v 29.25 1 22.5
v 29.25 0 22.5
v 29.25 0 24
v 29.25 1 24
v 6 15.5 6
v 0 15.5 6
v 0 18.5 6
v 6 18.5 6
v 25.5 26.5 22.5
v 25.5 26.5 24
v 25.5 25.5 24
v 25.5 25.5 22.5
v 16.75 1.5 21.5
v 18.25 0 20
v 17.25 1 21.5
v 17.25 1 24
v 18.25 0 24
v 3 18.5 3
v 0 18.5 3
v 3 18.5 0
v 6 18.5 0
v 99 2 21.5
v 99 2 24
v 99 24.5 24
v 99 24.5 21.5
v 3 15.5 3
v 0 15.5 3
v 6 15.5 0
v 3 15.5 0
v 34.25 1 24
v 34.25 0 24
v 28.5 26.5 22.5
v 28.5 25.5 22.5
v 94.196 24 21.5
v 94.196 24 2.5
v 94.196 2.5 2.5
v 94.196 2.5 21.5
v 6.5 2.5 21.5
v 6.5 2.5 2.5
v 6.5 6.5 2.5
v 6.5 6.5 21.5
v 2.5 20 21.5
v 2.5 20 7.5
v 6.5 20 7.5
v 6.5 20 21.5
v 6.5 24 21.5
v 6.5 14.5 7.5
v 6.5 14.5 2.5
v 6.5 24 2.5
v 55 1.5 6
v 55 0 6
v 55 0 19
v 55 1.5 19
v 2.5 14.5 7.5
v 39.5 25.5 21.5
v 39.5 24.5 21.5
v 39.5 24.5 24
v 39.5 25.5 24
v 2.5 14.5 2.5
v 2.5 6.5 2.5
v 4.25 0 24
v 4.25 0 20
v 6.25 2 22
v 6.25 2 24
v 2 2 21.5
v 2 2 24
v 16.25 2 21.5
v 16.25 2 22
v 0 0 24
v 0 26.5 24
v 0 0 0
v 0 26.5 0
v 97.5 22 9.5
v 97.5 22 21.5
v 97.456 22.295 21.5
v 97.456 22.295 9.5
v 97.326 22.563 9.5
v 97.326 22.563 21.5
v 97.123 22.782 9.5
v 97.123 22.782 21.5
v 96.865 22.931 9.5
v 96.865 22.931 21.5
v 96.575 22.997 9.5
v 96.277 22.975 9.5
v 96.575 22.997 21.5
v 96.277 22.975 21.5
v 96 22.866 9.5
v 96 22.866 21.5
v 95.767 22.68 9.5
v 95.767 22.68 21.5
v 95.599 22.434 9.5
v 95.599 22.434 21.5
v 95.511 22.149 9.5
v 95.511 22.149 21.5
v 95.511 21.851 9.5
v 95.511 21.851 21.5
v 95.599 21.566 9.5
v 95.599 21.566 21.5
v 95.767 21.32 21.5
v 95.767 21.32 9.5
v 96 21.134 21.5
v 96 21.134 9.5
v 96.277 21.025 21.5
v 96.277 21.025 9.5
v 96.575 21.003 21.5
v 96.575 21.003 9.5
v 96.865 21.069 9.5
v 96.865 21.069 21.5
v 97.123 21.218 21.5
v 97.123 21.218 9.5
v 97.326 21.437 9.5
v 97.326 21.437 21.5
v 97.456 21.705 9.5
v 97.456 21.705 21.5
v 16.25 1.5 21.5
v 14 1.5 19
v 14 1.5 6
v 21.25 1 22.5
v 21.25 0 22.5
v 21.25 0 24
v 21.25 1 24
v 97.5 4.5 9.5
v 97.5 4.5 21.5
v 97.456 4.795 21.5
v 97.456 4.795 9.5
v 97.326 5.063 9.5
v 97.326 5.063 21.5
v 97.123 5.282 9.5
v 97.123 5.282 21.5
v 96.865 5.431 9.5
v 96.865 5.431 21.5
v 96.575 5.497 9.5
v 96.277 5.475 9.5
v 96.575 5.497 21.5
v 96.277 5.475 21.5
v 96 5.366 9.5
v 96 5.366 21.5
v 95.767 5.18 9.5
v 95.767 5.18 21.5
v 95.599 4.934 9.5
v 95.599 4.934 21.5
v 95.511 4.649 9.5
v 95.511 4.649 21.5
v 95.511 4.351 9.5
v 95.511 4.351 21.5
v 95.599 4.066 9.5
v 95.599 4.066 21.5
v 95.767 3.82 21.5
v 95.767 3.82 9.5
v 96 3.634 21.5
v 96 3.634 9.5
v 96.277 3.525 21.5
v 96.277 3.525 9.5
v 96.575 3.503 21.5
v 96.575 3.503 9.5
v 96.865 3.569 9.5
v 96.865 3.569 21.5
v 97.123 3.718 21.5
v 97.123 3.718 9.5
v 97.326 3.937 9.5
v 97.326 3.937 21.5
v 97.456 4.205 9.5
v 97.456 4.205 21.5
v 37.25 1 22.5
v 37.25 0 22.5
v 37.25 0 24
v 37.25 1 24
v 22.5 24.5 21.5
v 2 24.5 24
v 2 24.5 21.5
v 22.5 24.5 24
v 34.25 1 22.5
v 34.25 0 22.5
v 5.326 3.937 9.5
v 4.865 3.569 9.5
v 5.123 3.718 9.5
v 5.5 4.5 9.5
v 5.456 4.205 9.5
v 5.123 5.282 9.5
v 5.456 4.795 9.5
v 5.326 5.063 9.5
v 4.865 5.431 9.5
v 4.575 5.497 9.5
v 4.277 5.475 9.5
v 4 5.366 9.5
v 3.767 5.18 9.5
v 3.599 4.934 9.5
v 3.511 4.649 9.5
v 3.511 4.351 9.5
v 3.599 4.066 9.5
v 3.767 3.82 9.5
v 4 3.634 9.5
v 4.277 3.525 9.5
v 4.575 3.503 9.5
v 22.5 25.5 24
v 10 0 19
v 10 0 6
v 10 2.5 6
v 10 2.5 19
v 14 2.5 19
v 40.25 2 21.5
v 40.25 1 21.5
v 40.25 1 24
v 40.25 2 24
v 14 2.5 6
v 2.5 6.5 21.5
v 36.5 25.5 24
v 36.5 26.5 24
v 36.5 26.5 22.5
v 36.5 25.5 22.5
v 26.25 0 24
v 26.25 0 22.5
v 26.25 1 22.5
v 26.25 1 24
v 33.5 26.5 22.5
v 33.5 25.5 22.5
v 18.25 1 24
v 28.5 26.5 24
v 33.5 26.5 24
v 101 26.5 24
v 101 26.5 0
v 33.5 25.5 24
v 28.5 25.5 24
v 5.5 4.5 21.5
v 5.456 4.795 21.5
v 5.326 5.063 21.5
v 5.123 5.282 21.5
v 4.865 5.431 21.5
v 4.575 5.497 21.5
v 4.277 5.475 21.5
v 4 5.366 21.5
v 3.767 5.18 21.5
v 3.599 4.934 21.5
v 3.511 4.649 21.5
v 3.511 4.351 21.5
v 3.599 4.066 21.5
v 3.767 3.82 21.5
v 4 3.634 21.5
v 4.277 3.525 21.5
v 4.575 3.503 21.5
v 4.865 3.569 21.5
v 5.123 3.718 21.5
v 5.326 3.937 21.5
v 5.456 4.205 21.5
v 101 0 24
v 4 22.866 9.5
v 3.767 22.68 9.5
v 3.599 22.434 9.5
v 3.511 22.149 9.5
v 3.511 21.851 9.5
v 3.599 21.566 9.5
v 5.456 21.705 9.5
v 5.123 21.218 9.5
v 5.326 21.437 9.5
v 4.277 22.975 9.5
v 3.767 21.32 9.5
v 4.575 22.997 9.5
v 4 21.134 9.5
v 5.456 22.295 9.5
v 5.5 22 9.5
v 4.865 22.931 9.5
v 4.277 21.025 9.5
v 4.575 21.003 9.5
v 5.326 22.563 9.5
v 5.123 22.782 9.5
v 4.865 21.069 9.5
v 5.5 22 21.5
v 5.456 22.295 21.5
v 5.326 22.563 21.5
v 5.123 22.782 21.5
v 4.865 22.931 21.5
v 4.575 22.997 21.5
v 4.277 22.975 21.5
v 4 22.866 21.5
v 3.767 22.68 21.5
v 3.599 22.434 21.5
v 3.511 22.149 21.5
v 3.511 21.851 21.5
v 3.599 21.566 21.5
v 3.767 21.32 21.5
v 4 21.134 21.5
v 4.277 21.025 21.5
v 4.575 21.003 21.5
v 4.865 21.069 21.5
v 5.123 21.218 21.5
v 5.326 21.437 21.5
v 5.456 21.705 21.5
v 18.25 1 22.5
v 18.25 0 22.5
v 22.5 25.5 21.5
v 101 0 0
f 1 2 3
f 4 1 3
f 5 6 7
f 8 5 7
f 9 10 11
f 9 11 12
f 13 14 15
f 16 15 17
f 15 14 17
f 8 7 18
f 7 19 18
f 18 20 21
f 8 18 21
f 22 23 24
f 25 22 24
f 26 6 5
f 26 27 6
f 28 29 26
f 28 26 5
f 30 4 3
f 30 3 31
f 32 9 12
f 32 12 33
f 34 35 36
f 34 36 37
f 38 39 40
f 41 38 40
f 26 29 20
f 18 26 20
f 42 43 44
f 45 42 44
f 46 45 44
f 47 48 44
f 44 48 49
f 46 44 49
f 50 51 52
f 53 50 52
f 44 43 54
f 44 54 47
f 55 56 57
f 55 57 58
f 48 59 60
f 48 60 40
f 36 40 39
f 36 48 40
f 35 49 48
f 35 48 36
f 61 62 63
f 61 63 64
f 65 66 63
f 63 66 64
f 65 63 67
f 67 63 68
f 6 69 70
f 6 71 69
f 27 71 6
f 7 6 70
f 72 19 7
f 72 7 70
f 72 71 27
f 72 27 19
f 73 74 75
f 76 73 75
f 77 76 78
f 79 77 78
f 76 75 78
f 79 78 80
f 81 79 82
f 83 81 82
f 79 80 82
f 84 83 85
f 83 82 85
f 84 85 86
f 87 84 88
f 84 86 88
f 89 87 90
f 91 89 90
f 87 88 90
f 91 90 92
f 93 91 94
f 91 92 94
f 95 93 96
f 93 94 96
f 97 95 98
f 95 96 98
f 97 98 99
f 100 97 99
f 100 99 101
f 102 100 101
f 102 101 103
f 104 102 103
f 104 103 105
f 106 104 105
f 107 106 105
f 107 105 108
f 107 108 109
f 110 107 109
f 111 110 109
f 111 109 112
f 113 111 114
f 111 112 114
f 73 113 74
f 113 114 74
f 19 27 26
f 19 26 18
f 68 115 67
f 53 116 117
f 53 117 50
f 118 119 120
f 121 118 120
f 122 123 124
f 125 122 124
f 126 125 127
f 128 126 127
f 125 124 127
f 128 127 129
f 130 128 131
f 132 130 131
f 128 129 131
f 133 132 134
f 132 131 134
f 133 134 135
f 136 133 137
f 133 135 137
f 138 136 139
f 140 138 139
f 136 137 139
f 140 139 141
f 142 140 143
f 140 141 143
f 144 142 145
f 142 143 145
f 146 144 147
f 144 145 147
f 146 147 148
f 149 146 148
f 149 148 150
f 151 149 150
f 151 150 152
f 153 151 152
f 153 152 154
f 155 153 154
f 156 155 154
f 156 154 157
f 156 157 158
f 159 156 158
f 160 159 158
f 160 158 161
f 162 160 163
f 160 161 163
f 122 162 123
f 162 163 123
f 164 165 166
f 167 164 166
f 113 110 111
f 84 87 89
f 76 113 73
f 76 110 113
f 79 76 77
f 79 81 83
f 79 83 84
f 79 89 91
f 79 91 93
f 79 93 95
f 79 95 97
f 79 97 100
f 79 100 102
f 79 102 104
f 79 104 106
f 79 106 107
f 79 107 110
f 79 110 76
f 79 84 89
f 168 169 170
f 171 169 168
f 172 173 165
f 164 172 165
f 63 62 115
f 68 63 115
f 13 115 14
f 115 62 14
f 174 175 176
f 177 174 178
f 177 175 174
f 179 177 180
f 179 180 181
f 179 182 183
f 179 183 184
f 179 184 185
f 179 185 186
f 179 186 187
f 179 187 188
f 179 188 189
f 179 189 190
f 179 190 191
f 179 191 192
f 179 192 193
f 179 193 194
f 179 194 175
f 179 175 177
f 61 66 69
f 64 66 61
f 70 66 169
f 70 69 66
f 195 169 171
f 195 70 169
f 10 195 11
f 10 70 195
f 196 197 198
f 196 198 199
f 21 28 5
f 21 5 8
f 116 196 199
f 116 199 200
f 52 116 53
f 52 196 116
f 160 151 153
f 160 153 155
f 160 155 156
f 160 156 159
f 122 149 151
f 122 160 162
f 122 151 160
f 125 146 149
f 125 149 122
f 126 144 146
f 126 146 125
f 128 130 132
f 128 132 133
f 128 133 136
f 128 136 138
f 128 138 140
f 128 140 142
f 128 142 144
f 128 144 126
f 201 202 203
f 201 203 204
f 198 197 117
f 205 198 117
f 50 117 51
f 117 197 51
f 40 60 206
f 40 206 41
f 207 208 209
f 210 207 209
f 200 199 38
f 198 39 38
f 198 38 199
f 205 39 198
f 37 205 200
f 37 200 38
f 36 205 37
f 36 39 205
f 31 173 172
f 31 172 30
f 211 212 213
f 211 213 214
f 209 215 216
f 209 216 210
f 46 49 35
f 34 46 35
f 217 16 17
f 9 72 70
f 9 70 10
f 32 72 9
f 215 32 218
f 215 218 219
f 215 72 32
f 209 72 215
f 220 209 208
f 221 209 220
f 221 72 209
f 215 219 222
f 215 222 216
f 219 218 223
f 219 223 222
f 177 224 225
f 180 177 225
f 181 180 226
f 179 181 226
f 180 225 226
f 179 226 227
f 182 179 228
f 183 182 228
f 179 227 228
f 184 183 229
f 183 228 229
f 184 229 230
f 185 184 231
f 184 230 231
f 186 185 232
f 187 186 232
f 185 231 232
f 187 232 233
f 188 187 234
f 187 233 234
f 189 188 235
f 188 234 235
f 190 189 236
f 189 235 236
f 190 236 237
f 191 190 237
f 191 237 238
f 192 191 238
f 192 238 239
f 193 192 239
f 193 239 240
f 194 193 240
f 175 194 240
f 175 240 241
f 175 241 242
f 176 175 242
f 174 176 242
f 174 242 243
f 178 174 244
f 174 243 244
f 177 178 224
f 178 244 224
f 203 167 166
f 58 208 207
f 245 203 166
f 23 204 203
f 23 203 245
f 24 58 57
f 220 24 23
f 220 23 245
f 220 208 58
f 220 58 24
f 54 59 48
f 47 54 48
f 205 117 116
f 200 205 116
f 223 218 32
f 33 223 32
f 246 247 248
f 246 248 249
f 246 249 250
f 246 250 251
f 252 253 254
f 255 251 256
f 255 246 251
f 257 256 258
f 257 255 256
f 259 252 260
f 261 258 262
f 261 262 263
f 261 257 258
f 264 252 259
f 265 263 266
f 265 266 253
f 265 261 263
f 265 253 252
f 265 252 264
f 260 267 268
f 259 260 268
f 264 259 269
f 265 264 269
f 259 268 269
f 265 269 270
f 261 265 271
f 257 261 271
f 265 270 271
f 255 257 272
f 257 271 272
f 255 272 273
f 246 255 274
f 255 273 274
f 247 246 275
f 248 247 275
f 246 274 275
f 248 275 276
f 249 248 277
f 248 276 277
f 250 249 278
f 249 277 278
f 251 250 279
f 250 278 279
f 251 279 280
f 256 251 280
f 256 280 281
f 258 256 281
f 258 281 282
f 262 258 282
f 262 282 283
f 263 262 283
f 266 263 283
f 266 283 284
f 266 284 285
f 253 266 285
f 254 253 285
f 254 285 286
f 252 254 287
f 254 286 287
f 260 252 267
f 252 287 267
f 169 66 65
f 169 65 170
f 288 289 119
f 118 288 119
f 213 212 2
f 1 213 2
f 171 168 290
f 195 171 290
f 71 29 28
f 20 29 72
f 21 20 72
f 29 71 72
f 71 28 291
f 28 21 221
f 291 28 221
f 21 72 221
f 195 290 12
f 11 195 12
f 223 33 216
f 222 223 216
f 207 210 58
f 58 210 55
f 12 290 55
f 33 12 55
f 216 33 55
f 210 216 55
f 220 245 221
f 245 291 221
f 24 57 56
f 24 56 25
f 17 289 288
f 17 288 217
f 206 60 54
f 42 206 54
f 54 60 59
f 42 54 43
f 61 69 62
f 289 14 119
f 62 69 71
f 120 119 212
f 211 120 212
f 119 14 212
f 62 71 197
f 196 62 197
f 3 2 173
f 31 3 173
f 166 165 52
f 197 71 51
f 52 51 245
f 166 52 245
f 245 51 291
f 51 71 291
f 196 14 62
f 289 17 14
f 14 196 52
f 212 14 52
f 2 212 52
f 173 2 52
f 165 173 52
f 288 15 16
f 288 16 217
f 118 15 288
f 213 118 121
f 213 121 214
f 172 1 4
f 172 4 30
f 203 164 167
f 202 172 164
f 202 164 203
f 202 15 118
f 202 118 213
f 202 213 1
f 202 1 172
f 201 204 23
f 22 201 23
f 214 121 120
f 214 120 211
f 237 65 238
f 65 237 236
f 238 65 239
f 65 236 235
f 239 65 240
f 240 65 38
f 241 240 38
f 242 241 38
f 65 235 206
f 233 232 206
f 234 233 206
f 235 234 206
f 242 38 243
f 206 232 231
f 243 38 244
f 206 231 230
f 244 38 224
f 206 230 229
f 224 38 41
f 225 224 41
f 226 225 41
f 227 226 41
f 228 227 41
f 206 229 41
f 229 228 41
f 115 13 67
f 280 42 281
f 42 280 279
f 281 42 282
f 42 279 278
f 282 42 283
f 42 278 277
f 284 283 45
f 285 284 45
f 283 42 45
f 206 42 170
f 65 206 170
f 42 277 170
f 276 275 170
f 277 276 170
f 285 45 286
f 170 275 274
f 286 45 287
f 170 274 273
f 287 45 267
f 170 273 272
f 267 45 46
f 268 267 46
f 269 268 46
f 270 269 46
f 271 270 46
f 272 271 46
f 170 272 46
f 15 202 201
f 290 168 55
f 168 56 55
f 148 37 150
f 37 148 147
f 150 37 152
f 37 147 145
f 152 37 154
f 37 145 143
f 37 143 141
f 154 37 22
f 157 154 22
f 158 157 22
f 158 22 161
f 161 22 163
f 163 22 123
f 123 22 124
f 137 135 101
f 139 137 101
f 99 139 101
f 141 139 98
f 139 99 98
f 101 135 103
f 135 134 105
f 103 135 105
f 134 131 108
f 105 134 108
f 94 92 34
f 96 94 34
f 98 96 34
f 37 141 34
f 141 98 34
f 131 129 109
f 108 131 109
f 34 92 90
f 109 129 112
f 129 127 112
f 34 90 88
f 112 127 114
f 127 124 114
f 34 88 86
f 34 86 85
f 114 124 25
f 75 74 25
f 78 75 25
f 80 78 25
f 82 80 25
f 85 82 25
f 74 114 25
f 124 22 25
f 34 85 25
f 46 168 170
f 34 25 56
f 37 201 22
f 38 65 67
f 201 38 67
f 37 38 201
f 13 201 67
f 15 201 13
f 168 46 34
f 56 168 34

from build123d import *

# Parameters (mm, degrees)
SKETCH_1_W                = 101
SKETCH_1_H                = 26.5
EXTRUDE_1_DEPTH           = 2.5
SKETCH_2_W                = 101
SKETCH_2_H                = 26.5
SKETCH_2_W_2              = 96
SKETCH_2_H_2              = 21.5
EXTRUDE_2_DEPTH           = 21.5
SKETCH_3_W                = 4
SKETCH_3_H                = 4
EXTRUDE_3_DEPTH           = 19
SKETCH_5_R                = 1
CUT_EXTRUDE_1_DEPTH       = 12
SKETCH_6_W                = 45
SKETCH_6_H                = 13
CUT_EXTRUDE_2_DEPTH       = 1.5
SKETCH_7_W                = 4
SKETCH_7_H                = 13
CUT_EXTRUDE_3_DEPTH       = 1.5
SKETCH_8_W                = 97
SKETCH_8_H                = 22.5
CUT_EXTRUDE_4_DEPTH       = 2.5
CUT_EXTRUDE_5_REACH       = 109.141
SKETCH_9_W                = 10
SKETCH_9_H                = 2
SKETCH_9_W_2              = 3
SKETCH_9_H_2              = 1.5
CHAMFER_1_SIZE            = 2
CUT_EXTRUDE_6_REACH       = 109.141
SKETCH_11_W               = 3
SKETCH_11_H               = 1.5
CUT_EXTRUDE_7_REACH       = 109.141
SKETCH_12_W               = 3
SKETCH_12_H               = 3
SKETCH_14_W               = 4
SKETCH_14_H               = 5.5
SKETCH_14_W_2             = 3
SKETCH_14_H_2             = 3
EXTRUDE_4_DEPTH           = 5
CUT_EXTRUDE_8_REACH       = 109.141
SKETCH_13_W               = 3
SKETCH_13_H               = 3
SKETCH_15_W               = 4
SKETCH_15_H               = 5.5
EXTRUDE_5_DEPTH           = 1.5
SKETCH_16_W               = 19
SKETCH_16_H               = 21.5
EXTRUDE_6_DEPTH           = 1
CUT_EXTRUDE_START         = -2.5
CUT_EXTRUDE_9_OUTLINE_W   = 17
CUT_EXTRUDE_9_OUTLINE_H   = 1
CUT_EXTRUDE_9_OUTLINE_W_2 = 24
CUT_EXTRUDE_9_DEPTH       = 2.5


# Read off the part's stored shape, not the designer's step: 切除-拉伸9
with BuildPart() as part:
    # 草图1 → 凸台-拉伸1 (new body)
    with BuildSketch(Plane.XY):
        with Locations((50.5, 13.25)):
            Rectangle(SKETCH_1_W, SKETCH_1_H)
    extrude(amount=EXTRUDE_1_DEPTH)

    # 草图2 → 凸台-拉伸2 (add)
    with BuildSketch(Plane.XY.offset(2.5)):
        with Locations((50.5, 13.25)):
            Rectangle(SKETCH_2_W, SKETCH_2_H)
        with Locations((50.5, 13.25)):
            Rectangle(SKETCH_2_W_2, SKETCH_2_H_2, mode=Mode.SUBTRACT)
    extrude(amount=EXTRUDE_2_DEPTH)

    # 草图3 → 凸台-拉伸3 (add)
    with BuildSketch(Plane.XY.offset(2.5)):
        with Locations((4.5, 22)):
            Rectangle(SKETCH_3_W, SKETCH_3_H)
        with Locations((4.5, 4.5)):
            Rectangle(SKETCH_3_W, SKETCH_3_H)
        Polygon((98.5, 24), (95.195835911, 24), (95.195835911, 20), (95.195835911, 6.5), (95.195835911, 2.5), (98.5, 2.5), (98.5, 8.754439991), (98.5, 17.745560009), align=None)
    extrude(amount=EXTRUDE_3_DEPTH)

    # 草图5 → 切除-拉伸1 (cut)
    with BuildSketch(Plane.XY.offset(21.5)):
        with Locations((4.5, 22)):
            Circle(SKETCH_5_R)
        with Locations((4.5, 4.5)):
            Circle(SKETCH_5_R)
        with Locations((96.5, 22)):
            Circle(SKETCH_5_R)
        with Locations((96.5, 4.5)):
            Circle(SKETCH_5_R)
    extrude(amount=-CUT_EXTRUDE_1_DEPTH, mode=Mode.SUBTRACT)

    # 草图6 → 切除-拉伸2 (cut)
    with BuildSketch(Plane.XZ):
        with Locations((32.5, 12.5)):
            Rectangle(SKETCH_6_W, SKETCH_6_H)
    extrude(amount=-CUT_EXTRUDE_2_DEPTH, mode=Mode.SUBTRACT)

    # 草图7 → 切除-拉伸3 (cut)
    with BuildSketch(Plane.XZ.offset(-1.5)):
        with Locations((12, 12.5)):
            Rectangle(SKETCH_7_W, SKETCH_7_H)
    extrude(amount=-CUT_EXTRUDE_3_DEPTH, mode=Mode.SUBTRACT)

    # 草图8 → 切除-拉伸4 (cut)
    with BuildSketch(Plane.XY.offset(24)):
        with Locations((50.5, 13.25)):
            Rectangle(SKETCH_8_W, SKETCH_8_H)
    extrude(amount=-CUT_EXTRUDE_4_DEPTH, mode=Mode.SUBTRACT)

    # 草图9 → 切除-拉伸5 (cut, up to next)
    with BuildSketch(Plane.XZ, mode=Mode.PRIVATE) as cut_extrude_5_sk1:
        with Locations((11.25, 23)):
            Rectangle(SKETCH_9_W, SKETCH_9_H)
    cut_extrude_5_tool1 = extrude(cut_extrude_5_sk1.sketch, amount=-CUT_EXTRUDE_5_REACH, mode=Mode.PRIVATE) & part.part
    # 草图9 → 切除-拉伸5 (cut, up to next)
    with BuildSketch(Plane.XZ, mode=Mode.PRIVATE) as cut_extrude_5_sk2:
        with Locations((19.75, 23.25)):
            Rectangle(SKETCH_9_W_2, SKETCH_9_H_2)
    cut_extrude_5_tool2 = extrude(cut_extrude_5_sk2.sketch, amount=-CUT_EXTRUDE_5_REACH, mode=Mode.PRIVATE) & part.part
    # 草图9 → 切除-拉伸5 (cut, up to next)
    with BuildSketch(Plane.XZ, mode=Mode.PRIVATE) as cut_extrude_5_sk3:
        with Locations((27.75, 23.25)):
            Rectangle(SKETCH_9_W_2, SKETCH_9_H_2)
    cut_extrude_5_tool3 = extrude(cut_extrude_5_sk3.sketch, amount=-CUT_EXTRUDE_5_REACH, mode=Mode.PRIVATE) & part.part
    # 草图9 → 切除-拉伸5 (cut, up to next)
    with BuildSketch(Plane.XZ, mode=Mode.PRIVATE) as cut_extrude_5_sk4:
        with Locations((35.75, 23.25)):
            Rectangle(SKETCH_9_W_2, SKETCH_9_H_2)
    cut_extrude_5_tool4 = extrude(cut_extrude_5_sk4.sketch, amount=-CUT_EXTRUDE_5_REACH, mode=Mode.PRIVATE) & part.part
    add(cut_extrude_5_tool1.solids().sort_by_distance((11.25, 0, 23))[0], mode=Mode.SUBTRACT)
    add(cut_extrude_5_tool2.solids().sort_by_distance((19.75, 0, 23.25))[0], mode=Mode.SUBTRACT)
    add(cut_extrude_5_tool3.solids().sort_by_distance((27.75, 0, 23.25))[0], mode=Mode.SUBTRACT)
    add(cut_extrude_5_tool4.solids().sort_by_distance((35.75, 0, 23.25))[0], mode=Mode.SUBTRACT)

    # 倒角1
    chamfer_1_edges = [part.edges().sort_by_distance(p)[0] for p in [
        (16.25, 0, 23),
        (11.25, 0, 22),
        (6.25, 0, 23),
    ]]
    chamfer(chamfer_1_edges, length=CHAMFER_1_SIZE - 0.0001)  # a hair under: the kernel refuses the full size

    # 草图11 → 切除-拉伸6 (cut, up to next)
    with BuildSketch(Plane(origin=(0, 26.5, 0), x_dir=(1, 0, 0), z_dir=(0, 1, 0)), mode=Mode.PRIVATE) as cut_extrude_6_sk1:
        with Locations((27, -23.25)):
            Rectangle(SKETCH_11_W, SKETCH_11_H)
    cut_extrude_6_tool1 = extrude(cut_extrude_6_sk1.sketch, amount=-CUT_EXTRUDE_6_REACH, mode=Mode.PRIVATE) & part.part
    # 草图11 → 切除-拉伸6 (cut, up to next)
    with BuildSketch(Plane(origin=(0, 26.5, 0), x_dir=(1, 0, 0), z_dir=(0, 1, 0)), mode=Mode.PRIVATE) as cut_extrude_6_sk2:
        with Locations((35, -23.25)):
            Rectangle(SKETCH_11_W, SKETCH_11_H)
    cut_extrude_6_tool2 = extrude(cut_extrude_6_sk2.sketch, amount=-CUT_EXTRUDE_6_REACH, mode=Mode.PRIVATE) & part.part
    add(cut_extrude_6_tool1.solids().sort_by_distance((27, 26.5, 23.25))[0], mode=Mode.SUBTRACT)
    add(cut_extrude_6_tool2.solids().sort_by_distance((35, 26.5, 23.25))[0], mode=Mode.SUBTRACT)

    # 草图12 → 切除-拉伸7 (cut, up to next)
    with BuildSketch(Plane(origin=(0, 0, 0), x_dir=(-1, 0, 0), z_dir=(0, 0, -1)), mode=Mode.PRIVATE) as cut_extrude_7_sk1:
        with Locations((-4.5, 17)):
            Rectangle(SKETCH_12_W, SKETCH_12_H)
    cut_extrude_7_tool1 = extrude(cut_extrude_7_sk1.sketch, amount=-CUT_EXTRUDE_7_REACH, mode=Mode.PRIVATE) & part.part
    add(cut_extrude_7_tool1.solids().sort_by_distance((4.5, 17, 0))[0], mode=Mode.SUBTRACT)

    # 草图14 → 凸台-拉伸4 (add)
    with BuildSketch(Plane.XY.offset(2.5)):
        with Locations((4.5, 17.25)):
            Rectangle(SKETCH_14_W, SKETCH_14_H)
        with Locations((4.5, 17)):
            Rectangle(SKETCH_14_W_2, SKETCH_14_H_2, mode=Mode.SUBTRACT)
    extrude(amount=EXTRUDE_4_DEPTH)

    # 草图13 → 切除-拉伸8 (cut, up to next)
    with BuildSketch(Plane.ZY, mode=Mode.PRIVATE) as cut_extrude_8_sk1:
        with Locations((4.5, 17)):
            Rectangle(SKETCH_13_W, SKETCH_13_H)
    cut_extrude_8_tool1 = extrude(cut_extrude_8_sk1.sketch, amount=-CUT_EXTRUDE_8_REACH, mode=Mode.PRIVATE) & part.part
    add(cut_extrude_8_tool1.solids().sort_by_distance((0, 17, 4.5))[0], mode=Mode.SUBTRACT)

    # 草图15 → 凸台-拉伸5 (add)
    with BuildSketch(Plane.XY.offset(7.5)):
        with Locations((4.5, 17.25)):
            Rectangle(SKETCH_15_W, SKETCH_15_H)
    extrude(amount=-EXTRUDE_5_DEPTH)

    # 草图16 → 凸台-拉伸6 (add)
    with BuildSketch(Plane.ZY.offset(-95.195835911)):
        with Locations((12, 13.25)):
            Rectangle(SKETCH_16_W, SKETCH_16_H)
    extrude(amount=EXTRUDE_6_DEPTH)

    # 切除-拉伸9 outline → 切除-拉伸9 (cut)
    with BuildSketch(Plane.XY.offset(24).offset(CUT_EXTRUDE_START)):
        with Locations((31, 25)):
            Rectangle(CUT_EXTRUDE_9_OUTLINE_W, CUT_EXTRUDE_9_OUTLINE_H)
        with Locations((28.25, 1.5)):
            Rectangle(CUT_EXTRUDE_9_OUTLINE_W_2, CUT_EXTRUDE_9_OUTLINE_H)
    extrude(amount=CUT_EXTRUDE_9_DEPTH, mode=Mode.SUBTRACT)


solid = part.part
